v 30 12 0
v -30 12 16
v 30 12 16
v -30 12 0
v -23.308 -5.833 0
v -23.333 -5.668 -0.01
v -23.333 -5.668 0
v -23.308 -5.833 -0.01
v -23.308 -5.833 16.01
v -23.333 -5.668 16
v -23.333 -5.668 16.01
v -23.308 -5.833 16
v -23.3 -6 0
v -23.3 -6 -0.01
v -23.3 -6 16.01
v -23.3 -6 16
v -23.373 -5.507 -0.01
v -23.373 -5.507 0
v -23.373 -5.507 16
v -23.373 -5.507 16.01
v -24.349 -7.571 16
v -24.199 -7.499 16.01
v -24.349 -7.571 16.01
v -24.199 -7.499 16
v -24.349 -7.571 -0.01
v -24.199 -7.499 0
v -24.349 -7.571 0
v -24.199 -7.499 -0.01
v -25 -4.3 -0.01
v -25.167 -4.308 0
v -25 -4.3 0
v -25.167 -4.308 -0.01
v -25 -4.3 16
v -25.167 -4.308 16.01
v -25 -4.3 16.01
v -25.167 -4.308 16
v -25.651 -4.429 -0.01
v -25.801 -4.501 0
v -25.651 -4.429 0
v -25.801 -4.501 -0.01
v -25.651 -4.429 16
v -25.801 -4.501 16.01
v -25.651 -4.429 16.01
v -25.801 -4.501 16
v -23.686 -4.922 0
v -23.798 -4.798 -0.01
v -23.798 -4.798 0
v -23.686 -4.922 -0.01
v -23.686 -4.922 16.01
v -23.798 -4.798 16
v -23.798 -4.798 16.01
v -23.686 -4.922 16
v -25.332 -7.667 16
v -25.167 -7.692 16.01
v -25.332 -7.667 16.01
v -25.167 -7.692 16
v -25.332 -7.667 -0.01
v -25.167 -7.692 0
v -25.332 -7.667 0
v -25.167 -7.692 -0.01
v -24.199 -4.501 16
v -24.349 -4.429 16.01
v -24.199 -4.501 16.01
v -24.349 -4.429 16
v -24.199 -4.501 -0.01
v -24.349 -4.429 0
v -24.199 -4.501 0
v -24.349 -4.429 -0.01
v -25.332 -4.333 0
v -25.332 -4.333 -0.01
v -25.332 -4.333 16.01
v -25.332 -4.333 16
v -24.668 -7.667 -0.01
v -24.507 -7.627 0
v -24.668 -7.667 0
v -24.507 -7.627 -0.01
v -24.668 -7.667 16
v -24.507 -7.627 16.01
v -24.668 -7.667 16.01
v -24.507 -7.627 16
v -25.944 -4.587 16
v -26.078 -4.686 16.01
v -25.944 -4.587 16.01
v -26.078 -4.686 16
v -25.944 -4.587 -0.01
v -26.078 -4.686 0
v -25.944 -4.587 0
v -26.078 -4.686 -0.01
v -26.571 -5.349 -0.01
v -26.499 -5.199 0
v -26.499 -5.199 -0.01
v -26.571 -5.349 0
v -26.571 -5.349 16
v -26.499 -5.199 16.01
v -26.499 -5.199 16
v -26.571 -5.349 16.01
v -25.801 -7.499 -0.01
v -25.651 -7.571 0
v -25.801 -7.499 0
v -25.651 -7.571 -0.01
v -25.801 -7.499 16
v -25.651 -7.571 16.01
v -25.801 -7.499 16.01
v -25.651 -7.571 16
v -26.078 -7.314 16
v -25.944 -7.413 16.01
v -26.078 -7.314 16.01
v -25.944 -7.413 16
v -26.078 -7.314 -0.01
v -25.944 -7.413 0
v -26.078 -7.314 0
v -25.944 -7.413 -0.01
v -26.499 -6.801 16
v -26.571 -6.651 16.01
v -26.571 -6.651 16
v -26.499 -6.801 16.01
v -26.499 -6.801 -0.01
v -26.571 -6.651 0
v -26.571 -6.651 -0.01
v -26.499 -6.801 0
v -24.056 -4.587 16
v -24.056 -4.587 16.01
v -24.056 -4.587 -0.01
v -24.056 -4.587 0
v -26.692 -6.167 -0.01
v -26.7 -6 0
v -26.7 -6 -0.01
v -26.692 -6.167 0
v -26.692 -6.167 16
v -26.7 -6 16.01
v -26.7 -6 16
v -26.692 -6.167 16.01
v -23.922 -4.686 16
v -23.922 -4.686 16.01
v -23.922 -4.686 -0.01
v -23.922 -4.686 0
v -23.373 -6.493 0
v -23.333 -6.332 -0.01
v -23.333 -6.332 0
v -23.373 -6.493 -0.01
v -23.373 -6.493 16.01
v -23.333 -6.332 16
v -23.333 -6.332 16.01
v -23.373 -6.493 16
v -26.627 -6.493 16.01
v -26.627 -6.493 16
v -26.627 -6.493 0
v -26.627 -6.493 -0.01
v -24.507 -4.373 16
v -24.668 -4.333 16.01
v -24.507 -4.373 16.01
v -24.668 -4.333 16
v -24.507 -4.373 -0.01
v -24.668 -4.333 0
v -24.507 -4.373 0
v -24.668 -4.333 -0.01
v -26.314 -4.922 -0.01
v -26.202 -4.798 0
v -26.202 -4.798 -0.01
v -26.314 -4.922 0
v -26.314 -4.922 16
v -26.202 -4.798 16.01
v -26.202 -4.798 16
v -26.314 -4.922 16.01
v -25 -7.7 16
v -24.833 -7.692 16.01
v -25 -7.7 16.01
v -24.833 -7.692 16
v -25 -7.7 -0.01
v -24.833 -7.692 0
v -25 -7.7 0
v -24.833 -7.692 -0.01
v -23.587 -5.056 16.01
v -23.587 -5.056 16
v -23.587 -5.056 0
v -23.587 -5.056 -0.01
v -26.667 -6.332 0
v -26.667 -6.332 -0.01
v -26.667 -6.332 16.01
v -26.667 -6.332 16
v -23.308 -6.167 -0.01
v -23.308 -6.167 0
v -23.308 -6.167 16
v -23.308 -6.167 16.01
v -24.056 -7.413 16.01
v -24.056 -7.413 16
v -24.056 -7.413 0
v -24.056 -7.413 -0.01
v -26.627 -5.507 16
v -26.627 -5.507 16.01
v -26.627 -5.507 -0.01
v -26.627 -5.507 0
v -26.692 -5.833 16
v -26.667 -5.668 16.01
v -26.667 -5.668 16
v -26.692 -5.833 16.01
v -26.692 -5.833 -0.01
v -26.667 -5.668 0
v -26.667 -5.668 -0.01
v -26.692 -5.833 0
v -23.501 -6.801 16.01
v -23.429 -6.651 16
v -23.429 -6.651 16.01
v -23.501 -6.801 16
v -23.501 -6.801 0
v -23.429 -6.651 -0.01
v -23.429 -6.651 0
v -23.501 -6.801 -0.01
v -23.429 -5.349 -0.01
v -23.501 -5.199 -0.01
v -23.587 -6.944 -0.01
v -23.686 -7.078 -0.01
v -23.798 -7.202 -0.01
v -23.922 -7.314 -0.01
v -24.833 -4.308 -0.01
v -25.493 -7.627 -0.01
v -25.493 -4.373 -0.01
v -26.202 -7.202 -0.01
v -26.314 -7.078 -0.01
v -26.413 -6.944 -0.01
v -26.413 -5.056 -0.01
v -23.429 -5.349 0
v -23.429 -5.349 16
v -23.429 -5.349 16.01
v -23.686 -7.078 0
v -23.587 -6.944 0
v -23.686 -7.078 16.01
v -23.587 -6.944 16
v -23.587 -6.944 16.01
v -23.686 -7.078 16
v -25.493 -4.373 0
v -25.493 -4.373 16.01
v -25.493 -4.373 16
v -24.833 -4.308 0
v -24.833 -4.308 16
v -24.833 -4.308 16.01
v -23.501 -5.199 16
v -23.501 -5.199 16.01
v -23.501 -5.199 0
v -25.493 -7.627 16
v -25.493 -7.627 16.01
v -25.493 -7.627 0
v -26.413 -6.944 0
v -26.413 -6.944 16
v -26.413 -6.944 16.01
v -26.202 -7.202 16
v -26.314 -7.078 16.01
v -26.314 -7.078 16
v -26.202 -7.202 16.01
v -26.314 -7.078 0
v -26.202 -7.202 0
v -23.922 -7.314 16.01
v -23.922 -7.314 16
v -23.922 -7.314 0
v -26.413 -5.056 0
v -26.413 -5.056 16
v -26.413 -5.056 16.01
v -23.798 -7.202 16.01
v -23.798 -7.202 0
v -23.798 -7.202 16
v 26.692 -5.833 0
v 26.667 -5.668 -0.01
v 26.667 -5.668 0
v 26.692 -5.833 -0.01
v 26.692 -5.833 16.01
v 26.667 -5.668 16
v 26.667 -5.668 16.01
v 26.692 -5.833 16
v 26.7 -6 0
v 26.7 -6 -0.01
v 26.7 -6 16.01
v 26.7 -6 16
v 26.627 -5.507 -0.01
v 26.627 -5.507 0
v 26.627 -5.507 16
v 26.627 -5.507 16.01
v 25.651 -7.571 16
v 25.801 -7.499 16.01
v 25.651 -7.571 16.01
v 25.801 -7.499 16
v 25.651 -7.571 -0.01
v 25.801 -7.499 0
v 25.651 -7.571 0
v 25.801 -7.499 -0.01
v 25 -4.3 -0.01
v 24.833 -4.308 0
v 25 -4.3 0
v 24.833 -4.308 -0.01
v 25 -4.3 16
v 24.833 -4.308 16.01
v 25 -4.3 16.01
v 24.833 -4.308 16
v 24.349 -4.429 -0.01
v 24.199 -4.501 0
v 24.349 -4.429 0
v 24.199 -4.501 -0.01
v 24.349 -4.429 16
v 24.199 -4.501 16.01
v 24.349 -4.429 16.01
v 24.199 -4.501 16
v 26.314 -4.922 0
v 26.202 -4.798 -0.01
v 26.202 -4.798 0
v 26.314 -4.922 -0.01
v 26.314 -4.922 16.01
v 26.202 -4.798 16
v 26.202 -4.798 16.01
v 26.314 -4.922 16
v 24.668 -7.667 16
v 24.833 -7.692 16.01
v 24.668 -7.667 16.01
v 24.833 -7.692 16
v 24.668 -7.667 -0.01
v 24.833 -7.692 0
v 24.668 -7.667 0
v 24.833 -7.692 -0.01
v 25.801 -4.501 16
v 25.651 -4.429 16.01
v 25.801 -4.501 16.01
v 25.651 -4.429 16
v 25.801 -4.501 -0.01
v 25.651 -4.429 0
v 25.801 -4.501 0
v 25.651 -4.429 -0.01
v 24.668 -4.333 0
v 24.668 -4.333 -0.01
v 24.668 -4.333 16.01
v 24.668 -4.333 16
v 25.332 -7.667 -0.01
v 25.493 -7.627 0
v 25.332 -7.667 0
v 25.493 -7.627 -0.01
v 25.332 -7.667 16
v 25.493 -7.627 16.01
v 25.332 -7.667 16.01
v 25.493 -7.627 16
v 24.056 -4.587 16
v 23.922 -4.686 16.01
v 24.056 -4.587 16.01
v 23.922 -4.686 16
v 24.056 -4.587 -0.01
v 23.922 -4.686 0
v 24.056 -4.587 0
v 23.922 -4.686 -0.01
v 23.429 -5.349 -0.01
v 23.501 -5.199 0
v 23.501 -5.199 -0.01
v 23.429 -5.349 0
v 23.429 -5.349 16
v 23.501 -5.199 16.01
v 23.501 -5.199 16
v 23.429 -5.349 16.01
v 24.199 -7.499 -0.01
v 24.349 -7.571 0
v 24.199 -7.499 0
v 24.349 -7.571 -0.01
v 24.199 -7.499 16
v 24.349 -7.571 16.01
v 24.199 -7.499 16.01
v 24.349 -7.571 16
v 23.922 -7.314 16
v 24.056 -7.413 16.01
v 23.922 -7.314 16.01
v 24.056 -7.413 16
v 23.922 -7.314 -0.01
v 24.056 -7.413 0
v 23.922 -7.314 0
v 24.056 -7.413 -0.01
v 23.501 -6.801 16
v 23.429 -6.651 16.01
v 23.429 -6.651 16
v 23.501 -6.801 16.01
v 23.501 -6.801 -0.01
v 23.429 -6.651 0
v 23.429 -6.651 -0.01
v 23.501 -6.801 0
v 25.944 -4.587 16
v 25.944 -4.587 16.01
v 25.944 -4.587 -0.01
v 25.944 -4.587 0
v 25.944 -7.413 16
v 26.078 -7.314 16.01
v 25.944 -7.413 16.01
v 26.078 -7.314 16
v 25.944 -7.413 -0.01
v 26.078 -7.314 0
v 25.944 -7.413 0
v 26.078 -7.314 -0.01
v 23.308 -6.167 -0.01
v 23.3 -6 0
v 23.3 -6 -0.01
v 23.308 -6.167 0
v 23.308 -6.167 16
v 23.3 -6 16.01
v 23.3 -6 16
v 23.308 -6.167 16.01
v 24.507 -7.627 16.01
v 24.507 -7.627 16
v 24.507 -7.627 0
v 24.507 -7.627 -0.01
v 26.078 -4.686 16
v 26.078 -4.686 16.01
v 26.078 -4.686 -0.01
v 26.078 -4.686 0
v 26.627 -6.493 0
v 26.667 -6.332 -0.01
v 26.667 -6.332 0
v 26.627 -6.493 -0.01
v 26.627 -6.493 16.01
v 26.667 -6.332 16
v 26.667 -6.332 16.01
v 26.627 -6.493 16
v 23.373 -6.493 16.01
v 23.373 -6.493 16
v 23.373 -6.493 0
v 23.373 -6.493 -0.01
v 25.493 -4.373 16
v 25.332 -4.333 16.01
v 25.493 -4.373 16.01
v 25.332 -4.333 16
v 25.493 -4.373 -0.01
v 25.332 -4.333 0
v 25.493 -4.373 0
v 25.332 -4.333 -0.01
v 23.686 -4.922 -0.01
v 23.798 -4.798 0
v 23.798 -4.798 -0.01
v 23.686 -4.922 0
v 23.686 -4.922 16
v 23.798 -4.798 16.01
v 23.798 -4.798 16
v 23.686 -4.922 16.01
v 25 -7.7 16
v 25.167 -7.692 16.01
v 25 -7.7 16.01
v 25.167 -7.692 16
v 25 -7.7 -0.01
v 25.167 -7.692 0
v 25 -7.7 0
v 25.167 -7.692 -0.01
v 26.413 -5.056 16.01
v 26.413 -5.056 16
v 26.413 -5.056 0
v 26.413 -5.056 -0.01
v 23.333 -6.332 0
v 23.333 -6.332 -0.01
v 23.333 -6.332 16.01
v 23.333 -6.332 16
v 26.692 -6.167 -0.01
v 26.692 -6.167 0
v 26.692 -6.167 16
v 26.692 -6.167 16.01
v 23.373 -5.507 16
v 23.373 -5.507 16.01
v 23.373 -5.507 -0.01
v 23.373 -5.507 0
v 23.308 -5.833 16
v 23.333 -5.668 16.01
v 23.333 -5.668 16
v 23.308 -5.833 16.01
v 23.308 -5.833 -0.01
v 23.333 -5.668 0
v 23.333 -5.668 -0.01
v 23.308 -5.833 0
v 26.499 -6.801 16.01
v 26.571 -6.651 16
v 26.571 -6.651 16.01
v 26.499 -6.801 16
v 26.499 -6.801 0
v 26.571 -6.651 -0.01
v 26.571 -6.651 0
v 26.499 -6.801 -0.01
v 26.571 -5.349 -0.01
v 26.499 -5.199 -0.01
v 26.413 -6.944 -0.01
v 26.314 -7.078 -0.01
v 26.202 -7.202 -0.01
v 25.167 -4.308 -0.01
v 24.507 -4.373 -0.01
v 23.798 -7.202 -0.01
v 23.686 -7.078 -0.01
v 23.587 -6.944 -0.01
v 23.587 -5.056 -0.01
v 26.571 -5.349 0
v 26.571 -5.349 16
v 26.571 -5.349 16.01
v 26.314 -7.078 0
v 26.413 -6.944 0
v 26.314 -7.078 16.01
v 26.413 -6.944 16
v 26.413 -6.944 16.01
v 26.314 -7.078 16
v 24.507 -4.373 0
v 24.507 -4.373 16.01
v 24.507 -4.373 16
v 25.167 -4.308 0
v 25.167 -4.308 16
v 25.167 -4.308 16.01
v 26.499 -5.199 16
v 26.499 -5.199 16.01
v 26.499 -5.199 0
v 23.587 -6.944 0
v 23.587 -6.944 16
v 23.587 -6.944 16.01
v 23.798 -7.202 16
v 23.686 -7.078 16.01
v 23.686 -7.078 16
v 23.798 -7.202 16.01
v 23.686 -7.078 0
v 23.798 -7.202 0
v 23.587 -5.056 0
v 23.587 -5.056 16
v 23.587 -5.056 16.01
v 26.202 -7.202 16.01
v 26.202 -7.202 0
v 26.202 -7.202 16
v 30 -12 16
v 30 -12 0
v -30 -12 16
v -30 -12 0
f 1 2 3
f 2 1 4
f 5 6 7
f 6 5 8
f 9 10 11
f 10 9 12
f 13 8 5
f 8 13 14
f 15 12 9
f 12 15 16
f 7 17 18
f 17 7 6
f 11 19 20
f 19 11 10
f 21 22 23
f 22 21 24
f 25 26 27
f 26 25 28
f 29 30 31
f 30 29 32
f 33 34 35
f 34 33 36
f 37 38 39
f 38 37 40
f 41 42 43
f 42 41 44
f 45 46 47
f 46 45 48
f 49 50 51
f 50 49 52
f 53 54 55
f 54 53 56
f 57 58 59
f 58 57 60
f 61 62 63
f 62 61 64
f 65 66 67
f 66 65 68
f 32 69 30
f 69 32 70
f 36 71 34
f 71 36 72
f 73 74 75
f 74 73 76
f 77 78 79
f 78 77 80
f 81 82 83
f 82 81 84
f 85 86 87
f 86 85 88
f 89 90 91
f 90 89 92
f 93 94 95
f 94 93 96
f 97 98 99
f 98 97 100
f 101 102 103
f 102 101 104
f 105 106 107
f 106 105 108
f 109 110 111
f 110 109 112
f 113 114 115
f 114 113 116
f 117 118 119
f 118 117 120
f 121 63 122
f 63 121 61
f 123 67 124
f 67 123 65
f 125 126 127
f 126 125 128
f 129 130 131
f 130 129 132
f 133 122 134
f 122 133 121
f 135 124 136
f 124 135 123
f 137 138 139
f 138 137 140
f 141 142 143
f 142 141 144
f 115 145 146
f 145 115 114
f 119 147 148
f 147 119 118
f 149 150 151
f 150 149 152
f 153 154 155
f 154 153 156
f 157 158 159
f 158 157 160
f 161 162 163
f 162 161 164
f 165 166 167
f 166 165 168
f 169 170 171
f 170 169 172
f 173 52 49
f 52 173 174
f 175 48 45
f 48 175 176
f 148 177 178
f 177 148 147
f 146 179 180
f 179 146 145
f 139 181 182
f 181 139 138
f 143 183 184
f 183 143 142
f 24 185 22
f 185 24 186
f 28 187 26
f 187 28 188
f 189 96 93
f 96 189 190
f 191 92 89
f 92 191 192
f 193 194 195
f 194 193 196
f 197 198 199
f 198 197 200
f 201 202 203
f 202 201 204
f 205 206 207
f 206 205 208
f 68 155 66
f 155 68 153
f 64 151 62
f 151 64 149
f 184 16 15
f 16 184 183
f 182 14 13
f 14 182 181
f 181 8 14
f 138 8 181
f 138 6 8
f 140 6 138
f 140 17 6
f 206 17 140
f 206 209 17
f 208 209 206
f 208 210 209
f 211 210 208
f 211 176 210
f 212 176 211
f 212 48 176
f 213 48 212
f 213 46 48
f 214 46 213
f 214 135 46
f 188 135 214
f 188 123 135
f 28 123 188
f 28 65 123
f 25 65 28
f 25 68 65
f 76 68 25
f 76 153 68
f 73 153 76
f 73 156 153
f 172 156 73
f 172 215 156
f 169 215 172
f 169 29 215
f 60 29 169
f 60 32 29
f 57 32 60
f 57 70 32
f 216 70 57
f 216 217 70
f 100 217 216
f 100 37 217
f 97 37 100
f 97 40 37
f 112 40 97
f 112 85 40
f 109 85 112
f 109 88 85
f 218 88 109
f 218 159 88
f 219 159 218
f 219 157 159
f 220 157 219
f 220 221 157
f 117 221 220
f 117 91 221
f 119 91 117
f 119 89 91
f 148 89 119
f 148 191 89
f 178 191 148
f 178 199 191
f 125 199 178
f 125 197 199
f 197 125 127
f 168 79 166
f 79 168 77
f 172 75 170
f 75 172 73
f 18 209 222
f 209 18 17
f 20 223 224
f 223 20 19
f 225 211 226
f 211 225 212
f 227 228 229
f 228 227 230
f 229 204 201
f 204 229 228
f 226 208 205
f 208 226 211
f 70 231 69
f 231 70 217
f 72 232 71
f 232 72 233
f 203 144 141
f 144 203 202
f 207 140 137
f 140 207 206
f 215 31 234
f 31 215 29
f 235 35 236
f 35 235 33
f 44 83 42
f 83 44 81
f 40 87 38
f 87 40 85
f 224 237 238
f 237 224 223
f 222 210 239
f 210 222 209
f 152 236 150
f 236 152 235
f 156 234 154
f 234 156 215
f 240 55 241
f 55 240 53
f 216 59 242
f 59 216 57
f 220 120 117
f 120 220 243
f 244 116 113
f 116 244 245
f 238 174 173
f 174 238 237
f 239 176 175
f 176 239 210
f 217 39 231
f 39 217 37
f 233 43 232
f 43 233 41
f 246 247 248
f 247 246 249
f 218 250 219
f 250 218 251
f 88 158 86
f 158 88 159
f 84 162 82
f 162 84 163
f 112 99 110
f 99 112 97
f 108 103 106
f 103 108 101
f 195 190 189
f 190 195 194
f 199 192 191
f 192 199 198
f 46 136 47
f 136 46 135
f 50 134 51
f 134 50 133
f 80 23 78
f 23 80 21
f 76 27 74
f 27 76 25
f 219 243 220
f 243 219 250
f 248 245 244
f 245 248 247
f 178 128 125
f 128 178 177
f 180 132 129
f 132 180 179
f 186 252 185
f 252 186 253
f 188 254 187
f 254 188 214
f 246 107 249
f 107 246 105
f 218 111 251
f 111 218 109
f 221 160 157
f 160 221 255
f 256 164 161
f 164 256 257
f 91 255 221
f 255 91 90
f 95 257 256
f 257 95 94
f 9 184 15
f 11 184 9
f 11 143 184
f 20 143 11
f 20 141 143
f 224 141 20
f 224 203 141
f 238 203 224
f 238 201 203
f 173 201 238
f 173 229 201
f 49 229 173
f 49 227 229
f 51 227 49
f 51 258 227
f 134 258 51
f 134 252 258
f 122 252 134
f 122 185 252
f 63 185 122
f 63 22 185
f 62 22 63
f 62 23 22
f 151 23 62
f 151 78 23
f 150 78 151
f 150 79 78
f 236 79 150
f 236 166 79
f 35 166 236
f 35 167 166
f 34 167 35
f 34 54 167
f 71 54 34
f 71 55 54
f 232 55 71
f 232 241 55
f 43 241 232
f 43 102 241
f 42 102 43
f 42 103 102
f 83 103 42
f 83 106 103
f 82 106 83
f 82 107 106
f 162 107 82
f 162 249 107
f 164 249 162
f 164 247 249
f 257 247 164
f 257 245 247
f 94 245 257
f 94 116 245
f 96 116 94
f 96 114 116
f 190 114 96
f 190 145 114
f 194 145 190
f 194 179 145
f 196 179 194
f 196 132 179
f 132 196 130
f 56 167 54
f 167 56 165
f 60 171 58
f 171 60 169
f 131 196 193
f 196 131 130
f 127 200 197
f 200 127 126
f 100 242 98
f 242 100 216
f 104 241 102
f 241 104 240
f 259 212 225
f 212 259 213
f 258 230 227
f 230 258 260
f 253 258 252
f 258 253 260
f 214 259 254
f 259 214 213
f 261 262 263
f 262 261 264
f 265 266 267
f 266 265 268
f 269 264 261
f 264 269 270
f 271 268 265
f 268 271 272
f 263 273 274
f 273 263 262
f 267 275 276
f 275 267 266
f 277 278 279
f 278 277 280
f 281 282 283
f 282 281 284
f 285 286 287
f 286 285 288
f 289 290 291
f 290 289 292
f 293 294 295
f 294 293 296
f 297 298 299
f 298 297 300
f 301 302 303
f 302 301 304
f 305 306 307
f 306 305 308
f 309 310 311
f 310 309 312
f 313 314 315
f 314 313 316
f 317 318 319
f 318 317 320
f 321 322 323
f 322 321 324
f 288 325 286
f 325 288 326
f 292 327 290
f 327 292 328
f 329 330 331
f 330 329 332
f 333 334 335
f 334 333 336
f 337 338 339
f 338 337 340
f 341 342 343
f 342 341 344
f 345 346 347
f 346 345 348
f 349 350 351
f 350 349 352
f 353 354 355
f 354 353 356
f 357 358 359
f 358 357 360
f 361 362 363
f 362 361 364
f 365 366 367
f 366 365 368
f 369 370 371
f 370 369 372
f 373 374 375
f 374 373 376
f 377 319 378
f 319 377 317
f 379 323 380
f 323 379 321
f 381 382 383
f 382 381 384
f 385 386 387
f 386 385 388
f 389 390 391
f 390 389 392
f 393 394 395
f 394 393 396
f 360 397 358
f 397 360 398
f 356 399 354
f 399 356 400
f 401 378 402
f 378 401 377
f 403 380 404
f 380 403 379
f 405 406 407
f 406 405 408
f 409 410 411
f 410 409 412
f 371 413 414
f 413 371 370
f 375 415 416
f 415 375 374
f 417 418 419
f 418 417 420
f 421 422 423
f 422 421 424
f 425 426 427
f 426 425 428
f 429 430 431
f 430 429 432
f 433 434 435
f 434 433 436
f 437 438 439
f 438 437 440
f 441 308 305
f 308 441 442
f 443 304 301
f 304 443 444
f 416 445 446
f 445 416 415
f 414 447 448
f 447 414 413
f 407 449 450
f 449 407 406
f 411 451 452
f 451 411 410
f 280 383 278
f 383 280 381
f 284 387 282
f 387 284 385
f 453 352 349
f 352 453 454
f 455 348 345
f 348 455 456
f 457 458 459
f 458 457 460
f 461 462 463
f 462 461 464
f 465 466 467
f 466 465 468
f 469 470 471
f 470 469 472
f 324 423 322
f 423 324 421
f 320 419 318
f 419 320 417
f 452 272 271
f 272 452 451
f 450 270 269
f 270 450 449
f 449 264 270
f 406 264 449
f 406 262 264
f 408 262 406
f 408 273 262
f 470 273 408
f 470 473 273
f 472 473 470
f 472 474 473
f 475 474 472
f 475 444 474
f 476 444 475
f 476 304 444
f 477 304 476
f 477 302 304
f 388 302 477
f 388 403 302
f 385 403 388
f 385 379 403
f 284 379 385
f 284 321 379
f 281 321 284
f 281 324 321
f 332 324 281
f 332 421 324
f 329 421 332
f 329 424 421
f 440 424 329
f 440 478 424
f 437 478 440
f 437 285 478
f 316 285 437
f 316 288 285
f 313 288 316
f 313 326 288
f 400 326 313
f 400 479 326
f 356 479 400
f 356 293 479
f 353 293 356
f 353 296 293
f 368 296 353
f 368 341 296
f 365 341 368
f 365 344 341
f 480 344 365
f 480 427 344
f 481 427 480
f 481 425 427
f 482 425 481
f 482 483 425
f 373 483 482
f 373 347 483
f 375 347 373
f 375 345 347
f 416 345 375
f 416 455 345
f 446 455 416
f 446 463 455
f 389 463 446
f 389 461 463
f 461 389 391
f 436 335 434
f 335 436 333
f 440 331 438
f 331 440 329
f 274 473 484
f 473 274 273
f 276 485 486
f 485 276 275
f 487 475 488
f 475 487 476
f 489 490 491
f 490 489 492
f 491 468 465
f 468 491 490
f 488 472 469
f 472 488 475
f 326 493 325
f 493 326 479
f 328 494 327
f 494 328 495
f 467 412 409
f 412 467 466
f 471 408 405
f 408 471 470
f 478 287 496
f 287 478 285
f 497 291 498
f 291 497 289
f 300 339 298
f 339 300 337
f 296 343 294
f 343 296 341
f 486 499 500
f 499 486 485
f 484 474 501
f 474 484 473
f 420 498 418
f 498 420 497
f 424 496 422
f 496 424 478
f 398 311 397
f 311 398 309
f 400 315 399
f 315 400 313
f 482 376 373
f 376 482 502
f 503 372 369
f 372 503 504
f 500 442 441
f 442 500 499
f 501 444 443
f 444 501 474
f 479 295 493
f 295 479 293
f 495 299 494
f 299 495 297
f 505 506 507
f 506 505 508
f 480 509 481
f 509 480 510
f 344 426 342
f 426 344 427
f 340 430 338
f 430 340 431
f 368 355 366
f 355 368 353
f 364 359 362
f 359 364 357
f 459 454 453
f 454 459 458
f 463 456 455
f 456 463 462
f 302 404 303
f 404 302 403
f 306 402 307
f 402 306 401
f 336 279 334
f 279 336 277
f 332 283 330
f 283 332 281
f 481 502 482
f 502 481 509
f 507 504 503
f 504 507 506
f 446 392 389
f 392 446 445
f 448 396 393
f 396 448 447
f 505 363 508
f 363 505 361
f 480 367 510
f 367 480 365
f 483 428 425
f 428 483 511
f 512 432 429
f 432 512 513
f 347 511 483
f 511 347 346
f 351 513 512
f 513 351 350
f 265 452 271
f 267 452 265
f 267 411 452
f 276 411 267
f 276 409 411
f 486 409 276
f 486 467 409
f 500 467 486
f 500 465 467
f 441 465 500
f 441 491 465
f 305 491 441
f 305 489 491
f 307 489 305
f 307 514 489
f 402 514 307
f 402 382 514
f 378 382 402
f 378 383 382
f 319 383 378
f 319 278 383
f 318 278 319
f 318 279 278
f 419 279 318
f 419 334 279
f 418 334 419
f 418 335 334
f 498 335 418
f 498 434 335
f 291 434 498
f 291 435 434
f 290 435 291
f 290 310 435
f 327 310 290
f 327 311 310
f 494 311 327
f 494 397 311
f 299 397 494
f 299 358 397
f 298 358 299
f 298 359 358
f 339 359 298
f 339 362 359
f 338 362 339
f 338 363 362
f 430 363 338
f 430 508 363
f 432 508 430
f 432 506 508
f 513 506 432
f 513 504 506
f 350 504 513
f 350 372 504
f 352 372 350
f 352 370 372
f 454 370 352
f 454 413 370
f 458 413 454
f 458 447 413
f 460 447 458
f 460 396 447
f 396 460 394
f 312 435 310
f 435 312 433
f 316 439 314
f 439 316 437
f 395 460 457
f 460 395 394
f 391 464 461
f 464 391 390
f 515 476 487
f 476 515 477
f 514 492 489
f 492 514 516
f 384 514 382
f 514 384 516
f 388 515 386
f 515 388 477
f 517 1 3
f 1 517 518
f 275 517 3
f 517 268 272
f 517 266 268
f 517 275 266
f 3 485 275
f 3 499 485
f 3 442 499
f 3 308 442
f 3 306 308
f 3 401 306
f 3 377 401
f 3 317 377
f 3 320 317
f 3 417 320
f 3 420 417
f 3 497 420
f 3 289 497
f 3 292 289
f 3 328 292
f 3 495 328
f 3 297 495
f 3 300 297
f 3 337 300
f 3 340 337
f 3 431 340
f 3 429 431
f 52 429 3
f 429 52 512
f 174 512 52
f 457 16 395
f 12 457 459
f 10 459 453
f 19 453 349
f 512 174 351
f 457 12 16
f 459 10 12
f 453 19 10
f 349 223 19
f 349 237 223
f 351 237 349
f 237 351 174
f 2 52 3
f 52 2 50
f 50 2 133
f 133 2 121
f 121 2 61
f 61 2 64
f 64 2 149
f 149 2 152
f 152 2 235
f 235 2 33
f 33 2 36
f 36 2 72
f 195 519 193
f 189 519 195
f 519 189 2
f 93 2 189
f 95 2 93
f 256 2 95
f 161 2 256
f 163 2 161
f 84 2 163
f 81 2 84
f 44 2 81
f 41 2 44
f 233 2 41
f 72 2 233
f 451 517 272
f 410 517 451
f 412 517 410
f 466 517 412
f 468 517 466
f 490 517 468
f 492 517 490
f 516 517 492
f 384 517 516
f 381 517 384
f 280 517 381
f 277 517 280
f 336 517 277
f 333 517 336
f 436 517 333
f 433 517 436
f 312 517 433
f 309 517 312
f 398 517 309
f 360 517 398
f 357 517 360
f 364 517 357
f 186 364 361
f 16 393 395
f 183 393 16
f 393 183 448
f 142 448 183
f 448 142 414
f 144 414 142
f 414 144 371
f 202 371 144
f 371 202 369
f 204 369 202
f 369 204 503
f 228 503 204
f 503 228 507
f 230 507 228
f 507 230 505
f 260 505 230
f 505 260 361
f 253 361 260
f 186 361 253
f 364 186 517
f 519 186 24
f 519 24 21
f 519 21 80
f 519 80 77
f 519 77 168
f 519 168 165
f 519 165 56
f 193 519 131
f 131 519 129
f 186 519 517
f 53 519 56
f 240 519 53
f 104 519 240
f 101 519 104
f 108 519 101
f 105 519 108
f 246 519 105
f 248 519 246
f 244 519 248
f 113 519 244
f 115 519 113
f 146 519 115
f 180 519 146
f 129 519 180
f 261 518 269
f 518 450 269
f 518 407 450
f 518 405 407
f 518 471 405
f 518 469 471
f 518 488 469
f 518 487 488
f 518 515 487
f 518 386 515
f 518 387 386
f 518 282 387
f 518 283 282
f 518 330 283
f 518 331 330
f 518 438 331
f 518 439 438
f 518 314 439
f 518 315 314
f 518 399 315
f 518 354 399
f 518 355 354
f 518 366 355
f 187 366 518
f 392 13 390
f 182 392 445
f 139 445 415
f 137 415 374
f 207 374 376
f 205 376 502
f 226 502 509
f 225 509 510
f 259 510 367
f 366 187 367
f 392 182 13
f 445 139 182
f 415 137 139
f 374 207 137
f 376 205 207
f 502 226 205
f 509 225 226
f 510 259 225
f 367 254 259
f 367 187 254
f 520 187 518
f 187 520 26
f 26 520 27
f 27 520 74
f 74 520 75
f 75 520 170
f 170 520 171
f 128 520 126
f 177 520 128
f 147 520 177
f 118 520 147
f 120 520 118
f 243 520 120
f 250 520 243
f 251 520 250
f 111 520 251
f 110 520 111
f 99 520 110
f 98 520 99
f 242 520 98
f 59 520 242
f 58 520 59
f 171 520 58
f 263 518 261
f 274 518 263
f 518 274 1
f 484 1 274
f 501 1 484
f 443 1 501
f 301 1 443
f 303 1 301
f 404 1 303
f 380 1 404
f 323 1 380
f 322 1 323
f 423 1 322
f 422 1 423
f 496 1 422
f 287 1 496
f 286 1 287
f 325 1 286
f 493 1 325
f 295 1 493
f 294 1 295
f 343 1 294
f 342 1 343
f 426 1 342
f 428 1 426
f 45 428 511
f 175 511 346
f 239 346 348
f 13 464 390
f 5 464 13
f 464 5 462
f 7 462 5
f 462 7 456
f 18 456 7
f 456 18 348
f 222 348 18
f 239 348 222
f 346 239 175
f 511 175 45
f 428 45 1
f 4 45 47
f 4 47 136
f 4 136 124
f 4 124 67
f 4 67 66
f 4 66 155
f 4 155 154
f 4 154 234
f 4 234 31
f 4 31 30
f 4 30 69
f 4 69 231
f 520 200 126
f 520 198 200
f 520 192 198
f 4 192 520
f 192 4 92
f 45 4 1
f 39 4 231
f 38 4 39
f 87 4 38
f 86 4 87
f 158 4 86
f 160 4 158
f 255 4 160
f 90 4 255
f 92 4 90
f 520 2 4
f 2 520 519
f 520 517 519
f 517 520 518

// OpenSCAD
// Manifold Block: 1-to-3 Splitter
// Dimensions measured in mm

// Block dimensions
block_len = 60;   // X
block_wid = 24;   // Y
block_hgt = 16;   // Z

// Channel geometry
channel_dia = 3;  // Internal channel diameter
mid_z = 8;        // Mid-plane height (z)

// Inlet socket (on -X face)
inlet_socket_dia = 4.2;
inlet_socket_depth = 8;
inlet_socket_y = 0;   // Centered in Y on the -X face
inlet_socket_x = -block_len/2; // On the -X face

// Main channel extent
main_channel_start_x = -block_len/2; // Starts at inlet
main_channel_end_x = 15;             // Stops inside block

// Outlet branches
outlet_branch_x_positions = [-15, 0, 15];
outlet_socket_dia = 4.2;
outlet_socket_depth = 6;
outlet_socket_y = block_wid/2; // On the +Y face

// Mounting holes
mount_hole_dia = 3.4;
mount_hole_x_positions = [-25, 25];
mount_hole_y = -6;

$fn = 64;

// Main block
translate([-block_len/2, -block_wid/2, 0])
  cube([block_len, block_wid, block_hgt]);

// --- Channels and Sockets ---

// Inlet Socket (on -X face, pointing in +X)
translate([inlet_socket_x, inlet_socket_y, mid_z])
  rotate([0, 90, 0]) // Pointing along +X
  cylinder(h=inlet_socket_depth, r=inlet_socket_dia/2, center=false);

// Main 3mm channel: from x = inlet_socket_x + inlet_socket_depth to x = main_channel_end_x
main_chan_3mm_start_x = inlet_socket_x + inlet_socket_depth;
main_chan_3mm_len = main_channel_end_x - main_chan_3mm_start_x;

translate([main_chan_3mm_start_x + main_chan_3mm_len/2, inlet_socket_y, mid_z])
  rotate([0, 90, 0])
  cylinder(h=main_chan_3mm_len, r=channel_dia/2, center=true);

// Outlet Branches (3mm channels)
// Each branch goes from the main channel (at specific x) to the +Y face.
// The main channel is at y = inlet_socket_y = 0.
// The outlet socket is at y = block_wid/2.
// So the 3mm channel runs from y=0 to y=(block_wid/2 - outlet_socket_depth).
// And the socket is the last part.

for (bx = outlet_branch_x_positions) {
  // 3mm channel
  branch_len = (block_wid/2 - outlet_socket_depth) - 0; // From y=0 to start of socket
  branch_center_y = 0 + branch_len/2;
  
  translate([bx, branch_center_y, mid_z])
    rotate([90, 0, 0]) // Pointing along +Y
    cylinder(h=branch_len, r=channel_dia/2, center=true);
    
  // Outlet Socket (4.2mm, 6mm deep) at +Y face
  socket_center_y = block_wid/2 - outlet_socket_depth/2;
  translate([bx, socket_center_y, mid_z])
    rotate([90, 0, 0])
    cylinder(h=outlet_socket_depth, r=outlet_socket_dia/2, center=true);
}

// --- Mounting Holes ---
for (mx = mount_hole_x_positions) {
  translate([mx, mount_hole_y, block_hgt/2])
    cylinder(h=block_hgt + 0.02, r=mount_hole_dia/2, center=true); // +0.02 to ensure through-hole
}
